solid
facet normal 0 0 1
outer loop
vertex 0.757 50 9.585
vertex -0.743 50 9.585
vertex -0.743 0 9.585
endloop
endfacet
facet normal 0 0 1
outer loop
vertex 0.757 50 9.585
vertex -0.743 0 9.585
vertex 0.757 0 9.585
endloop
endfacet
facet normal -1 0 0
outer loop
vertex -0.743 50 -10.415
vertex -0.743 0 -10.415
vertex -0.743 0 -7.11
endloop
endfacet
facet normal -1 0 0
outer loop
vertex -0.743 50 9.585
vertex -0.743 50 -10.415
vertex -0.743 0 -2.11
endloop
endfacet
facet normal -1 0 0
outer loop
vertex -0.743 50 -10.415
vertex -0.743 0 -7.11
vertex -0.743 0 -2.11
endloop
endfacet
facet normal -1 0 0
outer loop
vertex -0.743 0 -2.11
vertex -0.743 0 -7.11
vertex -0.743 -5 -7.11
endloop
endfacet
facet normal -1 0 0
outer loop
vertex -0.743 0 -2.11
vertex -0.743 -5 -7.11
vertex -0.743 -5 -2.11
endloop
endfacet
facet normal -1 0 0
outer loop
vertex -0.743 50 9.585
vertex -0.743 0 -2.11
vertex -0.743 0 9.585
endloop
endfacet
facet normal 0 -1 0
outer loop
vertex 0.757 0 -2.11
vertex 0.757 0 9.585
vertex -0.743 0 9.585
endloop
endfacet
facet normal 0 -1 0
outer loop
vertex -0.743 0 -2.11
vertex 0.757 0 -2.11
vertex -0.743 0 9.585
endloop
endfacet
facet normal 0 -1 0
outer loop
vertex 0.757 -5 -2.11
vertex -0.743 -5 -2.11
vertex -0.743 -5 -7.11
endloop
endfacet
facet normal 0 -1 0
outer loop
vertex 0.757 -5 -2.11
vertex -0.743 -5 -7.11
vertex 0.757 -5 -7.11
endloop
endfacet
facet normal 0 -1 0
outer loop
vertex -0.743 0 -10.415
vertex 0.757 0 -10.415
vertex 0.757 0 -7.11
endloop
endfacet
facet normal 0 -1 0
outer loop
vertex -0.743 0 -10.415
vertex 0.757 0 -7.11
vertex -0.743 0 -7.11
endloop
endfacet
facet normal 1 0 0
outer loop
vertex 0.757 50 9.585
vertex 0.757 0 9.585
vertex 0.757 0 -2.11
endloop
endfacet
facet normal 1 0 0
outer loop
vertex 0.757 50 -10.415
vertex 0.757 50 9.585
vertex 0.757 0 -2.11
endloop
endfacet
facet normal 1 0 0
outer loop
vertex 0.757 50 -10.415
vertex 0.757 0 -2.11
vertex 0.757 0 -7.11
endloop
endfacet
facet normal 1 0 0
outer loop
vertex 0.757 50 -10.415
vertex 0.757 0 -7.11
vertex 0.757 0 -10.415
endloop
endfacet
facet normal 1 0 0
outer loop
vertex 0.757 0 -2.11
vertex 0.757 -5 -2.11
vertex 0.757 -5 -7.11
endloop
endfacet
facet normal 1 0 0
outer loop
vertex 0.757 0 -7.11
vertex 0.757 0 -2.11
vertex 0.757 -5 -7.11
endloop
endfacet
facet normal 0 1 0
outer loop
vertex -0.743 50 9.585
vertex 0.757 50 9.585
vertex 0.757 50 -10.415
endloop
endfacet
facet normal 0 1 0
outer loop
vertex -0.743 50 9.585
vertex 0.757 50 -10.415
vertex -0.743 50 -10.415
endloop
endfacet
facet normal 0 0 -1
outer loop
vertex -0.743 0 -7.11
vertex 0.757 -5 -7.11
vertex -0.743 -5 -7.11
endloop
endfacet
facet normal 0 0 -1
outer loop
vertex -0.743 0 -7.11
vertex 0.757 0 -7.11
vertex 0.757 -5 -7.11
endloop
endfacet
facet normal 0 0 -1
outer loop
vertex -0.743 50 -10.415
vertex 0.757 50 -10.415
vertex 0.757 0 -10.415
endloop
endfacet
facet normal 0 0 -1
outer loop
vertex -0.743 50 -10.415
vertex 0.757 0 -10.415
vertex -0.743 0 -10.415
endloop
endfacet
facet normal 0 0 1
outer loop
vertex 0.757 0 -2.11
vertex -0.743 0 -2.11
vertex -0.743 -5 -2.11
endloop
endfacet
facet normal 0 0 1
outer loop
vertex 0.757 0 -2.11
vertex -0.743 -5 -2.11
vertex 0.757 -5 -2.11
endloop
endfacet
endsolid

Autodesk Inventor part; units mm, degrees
ref_plane "YZ Plane" through (0, 0, 0) normal (1, 0, 0) x (0, 1, 0)
ref_plane "XZ Plane" through (0, 0, 0) normal (0, 1, 0) x (-1, 0, 0)
ref_plane "XY Plane" through (0, 0, 0) normal (0, 0, 1) x (1, 0, 0)
sketch "Sketch1" plane through (0, 0, 0) normal (0, 1, 0) x (-1, 0, 0)
  line L0 (0.7432, 9.5847) -> (-0.7568, 9.5847)
  line L1 (-0.7568, 9.5847) -> (-0.7568, -10.4153)
  line L2 (-0.7568, -10.4153) -> (0.7432, -10.4153)
  line L3 (0.7432, -10.4153) -> (0.7432, 9.5847)
  point P0 (0, 0)
  dimension "d0" = 20
  dimension "d1" = 1.5
extrude "Extrusion1" add sketch "Sketch1" along normal blind 50
sketch "Sketch2" plane through (0, 0, 0) normal (0, -1, 0) x (1, 0, 0)
  point P0 (0, 0)
sketch "Sketch3" plane through (0, 0, 0) normal (0, -1, 0) x (1, 0, 0)
  line L0 (-0.7432, -10.4153) -> (-0.7432, 9.5847) projected
  line L1 (0.7568, 9.5847) -> (0.7568, -10.4153) projected
  line L2 (-0.7432, 6.59) -> (0.7568, 6.59)
  line L3 (0.7568, 6.59) -> (0.7568, 1.59)
  line L4 (0.7568, 1.59) -> (-0.7432, 1.59)
  line L5 (-0.7432, 1.59) -> (-0.7432, 6.59)
  line L6 (-0.7432, -2.11) -> (0.7568, -2.11)
  line L7 (0.7568, -2.11) -> (0.7568, -7.11)
  line L8 (0.7568, -7.11) -> (-0.7432, -7.11)
  line L9 (-0.7432, -7.11) -> (-0.7432, -2.11)
  point P0 (0, 0)
  point P1 (-0.7432, -7.11)
  point P2 (0.7568, -2.11)
  dimension "d4" = 5
  dimension "d5" = 5
extrude "Extrusion2" add sketch "Sketch3" along normal blind 5 contours L0 L6 L1 L8
properties part number "Arcylic_Panel_Base_20mm_P2"
